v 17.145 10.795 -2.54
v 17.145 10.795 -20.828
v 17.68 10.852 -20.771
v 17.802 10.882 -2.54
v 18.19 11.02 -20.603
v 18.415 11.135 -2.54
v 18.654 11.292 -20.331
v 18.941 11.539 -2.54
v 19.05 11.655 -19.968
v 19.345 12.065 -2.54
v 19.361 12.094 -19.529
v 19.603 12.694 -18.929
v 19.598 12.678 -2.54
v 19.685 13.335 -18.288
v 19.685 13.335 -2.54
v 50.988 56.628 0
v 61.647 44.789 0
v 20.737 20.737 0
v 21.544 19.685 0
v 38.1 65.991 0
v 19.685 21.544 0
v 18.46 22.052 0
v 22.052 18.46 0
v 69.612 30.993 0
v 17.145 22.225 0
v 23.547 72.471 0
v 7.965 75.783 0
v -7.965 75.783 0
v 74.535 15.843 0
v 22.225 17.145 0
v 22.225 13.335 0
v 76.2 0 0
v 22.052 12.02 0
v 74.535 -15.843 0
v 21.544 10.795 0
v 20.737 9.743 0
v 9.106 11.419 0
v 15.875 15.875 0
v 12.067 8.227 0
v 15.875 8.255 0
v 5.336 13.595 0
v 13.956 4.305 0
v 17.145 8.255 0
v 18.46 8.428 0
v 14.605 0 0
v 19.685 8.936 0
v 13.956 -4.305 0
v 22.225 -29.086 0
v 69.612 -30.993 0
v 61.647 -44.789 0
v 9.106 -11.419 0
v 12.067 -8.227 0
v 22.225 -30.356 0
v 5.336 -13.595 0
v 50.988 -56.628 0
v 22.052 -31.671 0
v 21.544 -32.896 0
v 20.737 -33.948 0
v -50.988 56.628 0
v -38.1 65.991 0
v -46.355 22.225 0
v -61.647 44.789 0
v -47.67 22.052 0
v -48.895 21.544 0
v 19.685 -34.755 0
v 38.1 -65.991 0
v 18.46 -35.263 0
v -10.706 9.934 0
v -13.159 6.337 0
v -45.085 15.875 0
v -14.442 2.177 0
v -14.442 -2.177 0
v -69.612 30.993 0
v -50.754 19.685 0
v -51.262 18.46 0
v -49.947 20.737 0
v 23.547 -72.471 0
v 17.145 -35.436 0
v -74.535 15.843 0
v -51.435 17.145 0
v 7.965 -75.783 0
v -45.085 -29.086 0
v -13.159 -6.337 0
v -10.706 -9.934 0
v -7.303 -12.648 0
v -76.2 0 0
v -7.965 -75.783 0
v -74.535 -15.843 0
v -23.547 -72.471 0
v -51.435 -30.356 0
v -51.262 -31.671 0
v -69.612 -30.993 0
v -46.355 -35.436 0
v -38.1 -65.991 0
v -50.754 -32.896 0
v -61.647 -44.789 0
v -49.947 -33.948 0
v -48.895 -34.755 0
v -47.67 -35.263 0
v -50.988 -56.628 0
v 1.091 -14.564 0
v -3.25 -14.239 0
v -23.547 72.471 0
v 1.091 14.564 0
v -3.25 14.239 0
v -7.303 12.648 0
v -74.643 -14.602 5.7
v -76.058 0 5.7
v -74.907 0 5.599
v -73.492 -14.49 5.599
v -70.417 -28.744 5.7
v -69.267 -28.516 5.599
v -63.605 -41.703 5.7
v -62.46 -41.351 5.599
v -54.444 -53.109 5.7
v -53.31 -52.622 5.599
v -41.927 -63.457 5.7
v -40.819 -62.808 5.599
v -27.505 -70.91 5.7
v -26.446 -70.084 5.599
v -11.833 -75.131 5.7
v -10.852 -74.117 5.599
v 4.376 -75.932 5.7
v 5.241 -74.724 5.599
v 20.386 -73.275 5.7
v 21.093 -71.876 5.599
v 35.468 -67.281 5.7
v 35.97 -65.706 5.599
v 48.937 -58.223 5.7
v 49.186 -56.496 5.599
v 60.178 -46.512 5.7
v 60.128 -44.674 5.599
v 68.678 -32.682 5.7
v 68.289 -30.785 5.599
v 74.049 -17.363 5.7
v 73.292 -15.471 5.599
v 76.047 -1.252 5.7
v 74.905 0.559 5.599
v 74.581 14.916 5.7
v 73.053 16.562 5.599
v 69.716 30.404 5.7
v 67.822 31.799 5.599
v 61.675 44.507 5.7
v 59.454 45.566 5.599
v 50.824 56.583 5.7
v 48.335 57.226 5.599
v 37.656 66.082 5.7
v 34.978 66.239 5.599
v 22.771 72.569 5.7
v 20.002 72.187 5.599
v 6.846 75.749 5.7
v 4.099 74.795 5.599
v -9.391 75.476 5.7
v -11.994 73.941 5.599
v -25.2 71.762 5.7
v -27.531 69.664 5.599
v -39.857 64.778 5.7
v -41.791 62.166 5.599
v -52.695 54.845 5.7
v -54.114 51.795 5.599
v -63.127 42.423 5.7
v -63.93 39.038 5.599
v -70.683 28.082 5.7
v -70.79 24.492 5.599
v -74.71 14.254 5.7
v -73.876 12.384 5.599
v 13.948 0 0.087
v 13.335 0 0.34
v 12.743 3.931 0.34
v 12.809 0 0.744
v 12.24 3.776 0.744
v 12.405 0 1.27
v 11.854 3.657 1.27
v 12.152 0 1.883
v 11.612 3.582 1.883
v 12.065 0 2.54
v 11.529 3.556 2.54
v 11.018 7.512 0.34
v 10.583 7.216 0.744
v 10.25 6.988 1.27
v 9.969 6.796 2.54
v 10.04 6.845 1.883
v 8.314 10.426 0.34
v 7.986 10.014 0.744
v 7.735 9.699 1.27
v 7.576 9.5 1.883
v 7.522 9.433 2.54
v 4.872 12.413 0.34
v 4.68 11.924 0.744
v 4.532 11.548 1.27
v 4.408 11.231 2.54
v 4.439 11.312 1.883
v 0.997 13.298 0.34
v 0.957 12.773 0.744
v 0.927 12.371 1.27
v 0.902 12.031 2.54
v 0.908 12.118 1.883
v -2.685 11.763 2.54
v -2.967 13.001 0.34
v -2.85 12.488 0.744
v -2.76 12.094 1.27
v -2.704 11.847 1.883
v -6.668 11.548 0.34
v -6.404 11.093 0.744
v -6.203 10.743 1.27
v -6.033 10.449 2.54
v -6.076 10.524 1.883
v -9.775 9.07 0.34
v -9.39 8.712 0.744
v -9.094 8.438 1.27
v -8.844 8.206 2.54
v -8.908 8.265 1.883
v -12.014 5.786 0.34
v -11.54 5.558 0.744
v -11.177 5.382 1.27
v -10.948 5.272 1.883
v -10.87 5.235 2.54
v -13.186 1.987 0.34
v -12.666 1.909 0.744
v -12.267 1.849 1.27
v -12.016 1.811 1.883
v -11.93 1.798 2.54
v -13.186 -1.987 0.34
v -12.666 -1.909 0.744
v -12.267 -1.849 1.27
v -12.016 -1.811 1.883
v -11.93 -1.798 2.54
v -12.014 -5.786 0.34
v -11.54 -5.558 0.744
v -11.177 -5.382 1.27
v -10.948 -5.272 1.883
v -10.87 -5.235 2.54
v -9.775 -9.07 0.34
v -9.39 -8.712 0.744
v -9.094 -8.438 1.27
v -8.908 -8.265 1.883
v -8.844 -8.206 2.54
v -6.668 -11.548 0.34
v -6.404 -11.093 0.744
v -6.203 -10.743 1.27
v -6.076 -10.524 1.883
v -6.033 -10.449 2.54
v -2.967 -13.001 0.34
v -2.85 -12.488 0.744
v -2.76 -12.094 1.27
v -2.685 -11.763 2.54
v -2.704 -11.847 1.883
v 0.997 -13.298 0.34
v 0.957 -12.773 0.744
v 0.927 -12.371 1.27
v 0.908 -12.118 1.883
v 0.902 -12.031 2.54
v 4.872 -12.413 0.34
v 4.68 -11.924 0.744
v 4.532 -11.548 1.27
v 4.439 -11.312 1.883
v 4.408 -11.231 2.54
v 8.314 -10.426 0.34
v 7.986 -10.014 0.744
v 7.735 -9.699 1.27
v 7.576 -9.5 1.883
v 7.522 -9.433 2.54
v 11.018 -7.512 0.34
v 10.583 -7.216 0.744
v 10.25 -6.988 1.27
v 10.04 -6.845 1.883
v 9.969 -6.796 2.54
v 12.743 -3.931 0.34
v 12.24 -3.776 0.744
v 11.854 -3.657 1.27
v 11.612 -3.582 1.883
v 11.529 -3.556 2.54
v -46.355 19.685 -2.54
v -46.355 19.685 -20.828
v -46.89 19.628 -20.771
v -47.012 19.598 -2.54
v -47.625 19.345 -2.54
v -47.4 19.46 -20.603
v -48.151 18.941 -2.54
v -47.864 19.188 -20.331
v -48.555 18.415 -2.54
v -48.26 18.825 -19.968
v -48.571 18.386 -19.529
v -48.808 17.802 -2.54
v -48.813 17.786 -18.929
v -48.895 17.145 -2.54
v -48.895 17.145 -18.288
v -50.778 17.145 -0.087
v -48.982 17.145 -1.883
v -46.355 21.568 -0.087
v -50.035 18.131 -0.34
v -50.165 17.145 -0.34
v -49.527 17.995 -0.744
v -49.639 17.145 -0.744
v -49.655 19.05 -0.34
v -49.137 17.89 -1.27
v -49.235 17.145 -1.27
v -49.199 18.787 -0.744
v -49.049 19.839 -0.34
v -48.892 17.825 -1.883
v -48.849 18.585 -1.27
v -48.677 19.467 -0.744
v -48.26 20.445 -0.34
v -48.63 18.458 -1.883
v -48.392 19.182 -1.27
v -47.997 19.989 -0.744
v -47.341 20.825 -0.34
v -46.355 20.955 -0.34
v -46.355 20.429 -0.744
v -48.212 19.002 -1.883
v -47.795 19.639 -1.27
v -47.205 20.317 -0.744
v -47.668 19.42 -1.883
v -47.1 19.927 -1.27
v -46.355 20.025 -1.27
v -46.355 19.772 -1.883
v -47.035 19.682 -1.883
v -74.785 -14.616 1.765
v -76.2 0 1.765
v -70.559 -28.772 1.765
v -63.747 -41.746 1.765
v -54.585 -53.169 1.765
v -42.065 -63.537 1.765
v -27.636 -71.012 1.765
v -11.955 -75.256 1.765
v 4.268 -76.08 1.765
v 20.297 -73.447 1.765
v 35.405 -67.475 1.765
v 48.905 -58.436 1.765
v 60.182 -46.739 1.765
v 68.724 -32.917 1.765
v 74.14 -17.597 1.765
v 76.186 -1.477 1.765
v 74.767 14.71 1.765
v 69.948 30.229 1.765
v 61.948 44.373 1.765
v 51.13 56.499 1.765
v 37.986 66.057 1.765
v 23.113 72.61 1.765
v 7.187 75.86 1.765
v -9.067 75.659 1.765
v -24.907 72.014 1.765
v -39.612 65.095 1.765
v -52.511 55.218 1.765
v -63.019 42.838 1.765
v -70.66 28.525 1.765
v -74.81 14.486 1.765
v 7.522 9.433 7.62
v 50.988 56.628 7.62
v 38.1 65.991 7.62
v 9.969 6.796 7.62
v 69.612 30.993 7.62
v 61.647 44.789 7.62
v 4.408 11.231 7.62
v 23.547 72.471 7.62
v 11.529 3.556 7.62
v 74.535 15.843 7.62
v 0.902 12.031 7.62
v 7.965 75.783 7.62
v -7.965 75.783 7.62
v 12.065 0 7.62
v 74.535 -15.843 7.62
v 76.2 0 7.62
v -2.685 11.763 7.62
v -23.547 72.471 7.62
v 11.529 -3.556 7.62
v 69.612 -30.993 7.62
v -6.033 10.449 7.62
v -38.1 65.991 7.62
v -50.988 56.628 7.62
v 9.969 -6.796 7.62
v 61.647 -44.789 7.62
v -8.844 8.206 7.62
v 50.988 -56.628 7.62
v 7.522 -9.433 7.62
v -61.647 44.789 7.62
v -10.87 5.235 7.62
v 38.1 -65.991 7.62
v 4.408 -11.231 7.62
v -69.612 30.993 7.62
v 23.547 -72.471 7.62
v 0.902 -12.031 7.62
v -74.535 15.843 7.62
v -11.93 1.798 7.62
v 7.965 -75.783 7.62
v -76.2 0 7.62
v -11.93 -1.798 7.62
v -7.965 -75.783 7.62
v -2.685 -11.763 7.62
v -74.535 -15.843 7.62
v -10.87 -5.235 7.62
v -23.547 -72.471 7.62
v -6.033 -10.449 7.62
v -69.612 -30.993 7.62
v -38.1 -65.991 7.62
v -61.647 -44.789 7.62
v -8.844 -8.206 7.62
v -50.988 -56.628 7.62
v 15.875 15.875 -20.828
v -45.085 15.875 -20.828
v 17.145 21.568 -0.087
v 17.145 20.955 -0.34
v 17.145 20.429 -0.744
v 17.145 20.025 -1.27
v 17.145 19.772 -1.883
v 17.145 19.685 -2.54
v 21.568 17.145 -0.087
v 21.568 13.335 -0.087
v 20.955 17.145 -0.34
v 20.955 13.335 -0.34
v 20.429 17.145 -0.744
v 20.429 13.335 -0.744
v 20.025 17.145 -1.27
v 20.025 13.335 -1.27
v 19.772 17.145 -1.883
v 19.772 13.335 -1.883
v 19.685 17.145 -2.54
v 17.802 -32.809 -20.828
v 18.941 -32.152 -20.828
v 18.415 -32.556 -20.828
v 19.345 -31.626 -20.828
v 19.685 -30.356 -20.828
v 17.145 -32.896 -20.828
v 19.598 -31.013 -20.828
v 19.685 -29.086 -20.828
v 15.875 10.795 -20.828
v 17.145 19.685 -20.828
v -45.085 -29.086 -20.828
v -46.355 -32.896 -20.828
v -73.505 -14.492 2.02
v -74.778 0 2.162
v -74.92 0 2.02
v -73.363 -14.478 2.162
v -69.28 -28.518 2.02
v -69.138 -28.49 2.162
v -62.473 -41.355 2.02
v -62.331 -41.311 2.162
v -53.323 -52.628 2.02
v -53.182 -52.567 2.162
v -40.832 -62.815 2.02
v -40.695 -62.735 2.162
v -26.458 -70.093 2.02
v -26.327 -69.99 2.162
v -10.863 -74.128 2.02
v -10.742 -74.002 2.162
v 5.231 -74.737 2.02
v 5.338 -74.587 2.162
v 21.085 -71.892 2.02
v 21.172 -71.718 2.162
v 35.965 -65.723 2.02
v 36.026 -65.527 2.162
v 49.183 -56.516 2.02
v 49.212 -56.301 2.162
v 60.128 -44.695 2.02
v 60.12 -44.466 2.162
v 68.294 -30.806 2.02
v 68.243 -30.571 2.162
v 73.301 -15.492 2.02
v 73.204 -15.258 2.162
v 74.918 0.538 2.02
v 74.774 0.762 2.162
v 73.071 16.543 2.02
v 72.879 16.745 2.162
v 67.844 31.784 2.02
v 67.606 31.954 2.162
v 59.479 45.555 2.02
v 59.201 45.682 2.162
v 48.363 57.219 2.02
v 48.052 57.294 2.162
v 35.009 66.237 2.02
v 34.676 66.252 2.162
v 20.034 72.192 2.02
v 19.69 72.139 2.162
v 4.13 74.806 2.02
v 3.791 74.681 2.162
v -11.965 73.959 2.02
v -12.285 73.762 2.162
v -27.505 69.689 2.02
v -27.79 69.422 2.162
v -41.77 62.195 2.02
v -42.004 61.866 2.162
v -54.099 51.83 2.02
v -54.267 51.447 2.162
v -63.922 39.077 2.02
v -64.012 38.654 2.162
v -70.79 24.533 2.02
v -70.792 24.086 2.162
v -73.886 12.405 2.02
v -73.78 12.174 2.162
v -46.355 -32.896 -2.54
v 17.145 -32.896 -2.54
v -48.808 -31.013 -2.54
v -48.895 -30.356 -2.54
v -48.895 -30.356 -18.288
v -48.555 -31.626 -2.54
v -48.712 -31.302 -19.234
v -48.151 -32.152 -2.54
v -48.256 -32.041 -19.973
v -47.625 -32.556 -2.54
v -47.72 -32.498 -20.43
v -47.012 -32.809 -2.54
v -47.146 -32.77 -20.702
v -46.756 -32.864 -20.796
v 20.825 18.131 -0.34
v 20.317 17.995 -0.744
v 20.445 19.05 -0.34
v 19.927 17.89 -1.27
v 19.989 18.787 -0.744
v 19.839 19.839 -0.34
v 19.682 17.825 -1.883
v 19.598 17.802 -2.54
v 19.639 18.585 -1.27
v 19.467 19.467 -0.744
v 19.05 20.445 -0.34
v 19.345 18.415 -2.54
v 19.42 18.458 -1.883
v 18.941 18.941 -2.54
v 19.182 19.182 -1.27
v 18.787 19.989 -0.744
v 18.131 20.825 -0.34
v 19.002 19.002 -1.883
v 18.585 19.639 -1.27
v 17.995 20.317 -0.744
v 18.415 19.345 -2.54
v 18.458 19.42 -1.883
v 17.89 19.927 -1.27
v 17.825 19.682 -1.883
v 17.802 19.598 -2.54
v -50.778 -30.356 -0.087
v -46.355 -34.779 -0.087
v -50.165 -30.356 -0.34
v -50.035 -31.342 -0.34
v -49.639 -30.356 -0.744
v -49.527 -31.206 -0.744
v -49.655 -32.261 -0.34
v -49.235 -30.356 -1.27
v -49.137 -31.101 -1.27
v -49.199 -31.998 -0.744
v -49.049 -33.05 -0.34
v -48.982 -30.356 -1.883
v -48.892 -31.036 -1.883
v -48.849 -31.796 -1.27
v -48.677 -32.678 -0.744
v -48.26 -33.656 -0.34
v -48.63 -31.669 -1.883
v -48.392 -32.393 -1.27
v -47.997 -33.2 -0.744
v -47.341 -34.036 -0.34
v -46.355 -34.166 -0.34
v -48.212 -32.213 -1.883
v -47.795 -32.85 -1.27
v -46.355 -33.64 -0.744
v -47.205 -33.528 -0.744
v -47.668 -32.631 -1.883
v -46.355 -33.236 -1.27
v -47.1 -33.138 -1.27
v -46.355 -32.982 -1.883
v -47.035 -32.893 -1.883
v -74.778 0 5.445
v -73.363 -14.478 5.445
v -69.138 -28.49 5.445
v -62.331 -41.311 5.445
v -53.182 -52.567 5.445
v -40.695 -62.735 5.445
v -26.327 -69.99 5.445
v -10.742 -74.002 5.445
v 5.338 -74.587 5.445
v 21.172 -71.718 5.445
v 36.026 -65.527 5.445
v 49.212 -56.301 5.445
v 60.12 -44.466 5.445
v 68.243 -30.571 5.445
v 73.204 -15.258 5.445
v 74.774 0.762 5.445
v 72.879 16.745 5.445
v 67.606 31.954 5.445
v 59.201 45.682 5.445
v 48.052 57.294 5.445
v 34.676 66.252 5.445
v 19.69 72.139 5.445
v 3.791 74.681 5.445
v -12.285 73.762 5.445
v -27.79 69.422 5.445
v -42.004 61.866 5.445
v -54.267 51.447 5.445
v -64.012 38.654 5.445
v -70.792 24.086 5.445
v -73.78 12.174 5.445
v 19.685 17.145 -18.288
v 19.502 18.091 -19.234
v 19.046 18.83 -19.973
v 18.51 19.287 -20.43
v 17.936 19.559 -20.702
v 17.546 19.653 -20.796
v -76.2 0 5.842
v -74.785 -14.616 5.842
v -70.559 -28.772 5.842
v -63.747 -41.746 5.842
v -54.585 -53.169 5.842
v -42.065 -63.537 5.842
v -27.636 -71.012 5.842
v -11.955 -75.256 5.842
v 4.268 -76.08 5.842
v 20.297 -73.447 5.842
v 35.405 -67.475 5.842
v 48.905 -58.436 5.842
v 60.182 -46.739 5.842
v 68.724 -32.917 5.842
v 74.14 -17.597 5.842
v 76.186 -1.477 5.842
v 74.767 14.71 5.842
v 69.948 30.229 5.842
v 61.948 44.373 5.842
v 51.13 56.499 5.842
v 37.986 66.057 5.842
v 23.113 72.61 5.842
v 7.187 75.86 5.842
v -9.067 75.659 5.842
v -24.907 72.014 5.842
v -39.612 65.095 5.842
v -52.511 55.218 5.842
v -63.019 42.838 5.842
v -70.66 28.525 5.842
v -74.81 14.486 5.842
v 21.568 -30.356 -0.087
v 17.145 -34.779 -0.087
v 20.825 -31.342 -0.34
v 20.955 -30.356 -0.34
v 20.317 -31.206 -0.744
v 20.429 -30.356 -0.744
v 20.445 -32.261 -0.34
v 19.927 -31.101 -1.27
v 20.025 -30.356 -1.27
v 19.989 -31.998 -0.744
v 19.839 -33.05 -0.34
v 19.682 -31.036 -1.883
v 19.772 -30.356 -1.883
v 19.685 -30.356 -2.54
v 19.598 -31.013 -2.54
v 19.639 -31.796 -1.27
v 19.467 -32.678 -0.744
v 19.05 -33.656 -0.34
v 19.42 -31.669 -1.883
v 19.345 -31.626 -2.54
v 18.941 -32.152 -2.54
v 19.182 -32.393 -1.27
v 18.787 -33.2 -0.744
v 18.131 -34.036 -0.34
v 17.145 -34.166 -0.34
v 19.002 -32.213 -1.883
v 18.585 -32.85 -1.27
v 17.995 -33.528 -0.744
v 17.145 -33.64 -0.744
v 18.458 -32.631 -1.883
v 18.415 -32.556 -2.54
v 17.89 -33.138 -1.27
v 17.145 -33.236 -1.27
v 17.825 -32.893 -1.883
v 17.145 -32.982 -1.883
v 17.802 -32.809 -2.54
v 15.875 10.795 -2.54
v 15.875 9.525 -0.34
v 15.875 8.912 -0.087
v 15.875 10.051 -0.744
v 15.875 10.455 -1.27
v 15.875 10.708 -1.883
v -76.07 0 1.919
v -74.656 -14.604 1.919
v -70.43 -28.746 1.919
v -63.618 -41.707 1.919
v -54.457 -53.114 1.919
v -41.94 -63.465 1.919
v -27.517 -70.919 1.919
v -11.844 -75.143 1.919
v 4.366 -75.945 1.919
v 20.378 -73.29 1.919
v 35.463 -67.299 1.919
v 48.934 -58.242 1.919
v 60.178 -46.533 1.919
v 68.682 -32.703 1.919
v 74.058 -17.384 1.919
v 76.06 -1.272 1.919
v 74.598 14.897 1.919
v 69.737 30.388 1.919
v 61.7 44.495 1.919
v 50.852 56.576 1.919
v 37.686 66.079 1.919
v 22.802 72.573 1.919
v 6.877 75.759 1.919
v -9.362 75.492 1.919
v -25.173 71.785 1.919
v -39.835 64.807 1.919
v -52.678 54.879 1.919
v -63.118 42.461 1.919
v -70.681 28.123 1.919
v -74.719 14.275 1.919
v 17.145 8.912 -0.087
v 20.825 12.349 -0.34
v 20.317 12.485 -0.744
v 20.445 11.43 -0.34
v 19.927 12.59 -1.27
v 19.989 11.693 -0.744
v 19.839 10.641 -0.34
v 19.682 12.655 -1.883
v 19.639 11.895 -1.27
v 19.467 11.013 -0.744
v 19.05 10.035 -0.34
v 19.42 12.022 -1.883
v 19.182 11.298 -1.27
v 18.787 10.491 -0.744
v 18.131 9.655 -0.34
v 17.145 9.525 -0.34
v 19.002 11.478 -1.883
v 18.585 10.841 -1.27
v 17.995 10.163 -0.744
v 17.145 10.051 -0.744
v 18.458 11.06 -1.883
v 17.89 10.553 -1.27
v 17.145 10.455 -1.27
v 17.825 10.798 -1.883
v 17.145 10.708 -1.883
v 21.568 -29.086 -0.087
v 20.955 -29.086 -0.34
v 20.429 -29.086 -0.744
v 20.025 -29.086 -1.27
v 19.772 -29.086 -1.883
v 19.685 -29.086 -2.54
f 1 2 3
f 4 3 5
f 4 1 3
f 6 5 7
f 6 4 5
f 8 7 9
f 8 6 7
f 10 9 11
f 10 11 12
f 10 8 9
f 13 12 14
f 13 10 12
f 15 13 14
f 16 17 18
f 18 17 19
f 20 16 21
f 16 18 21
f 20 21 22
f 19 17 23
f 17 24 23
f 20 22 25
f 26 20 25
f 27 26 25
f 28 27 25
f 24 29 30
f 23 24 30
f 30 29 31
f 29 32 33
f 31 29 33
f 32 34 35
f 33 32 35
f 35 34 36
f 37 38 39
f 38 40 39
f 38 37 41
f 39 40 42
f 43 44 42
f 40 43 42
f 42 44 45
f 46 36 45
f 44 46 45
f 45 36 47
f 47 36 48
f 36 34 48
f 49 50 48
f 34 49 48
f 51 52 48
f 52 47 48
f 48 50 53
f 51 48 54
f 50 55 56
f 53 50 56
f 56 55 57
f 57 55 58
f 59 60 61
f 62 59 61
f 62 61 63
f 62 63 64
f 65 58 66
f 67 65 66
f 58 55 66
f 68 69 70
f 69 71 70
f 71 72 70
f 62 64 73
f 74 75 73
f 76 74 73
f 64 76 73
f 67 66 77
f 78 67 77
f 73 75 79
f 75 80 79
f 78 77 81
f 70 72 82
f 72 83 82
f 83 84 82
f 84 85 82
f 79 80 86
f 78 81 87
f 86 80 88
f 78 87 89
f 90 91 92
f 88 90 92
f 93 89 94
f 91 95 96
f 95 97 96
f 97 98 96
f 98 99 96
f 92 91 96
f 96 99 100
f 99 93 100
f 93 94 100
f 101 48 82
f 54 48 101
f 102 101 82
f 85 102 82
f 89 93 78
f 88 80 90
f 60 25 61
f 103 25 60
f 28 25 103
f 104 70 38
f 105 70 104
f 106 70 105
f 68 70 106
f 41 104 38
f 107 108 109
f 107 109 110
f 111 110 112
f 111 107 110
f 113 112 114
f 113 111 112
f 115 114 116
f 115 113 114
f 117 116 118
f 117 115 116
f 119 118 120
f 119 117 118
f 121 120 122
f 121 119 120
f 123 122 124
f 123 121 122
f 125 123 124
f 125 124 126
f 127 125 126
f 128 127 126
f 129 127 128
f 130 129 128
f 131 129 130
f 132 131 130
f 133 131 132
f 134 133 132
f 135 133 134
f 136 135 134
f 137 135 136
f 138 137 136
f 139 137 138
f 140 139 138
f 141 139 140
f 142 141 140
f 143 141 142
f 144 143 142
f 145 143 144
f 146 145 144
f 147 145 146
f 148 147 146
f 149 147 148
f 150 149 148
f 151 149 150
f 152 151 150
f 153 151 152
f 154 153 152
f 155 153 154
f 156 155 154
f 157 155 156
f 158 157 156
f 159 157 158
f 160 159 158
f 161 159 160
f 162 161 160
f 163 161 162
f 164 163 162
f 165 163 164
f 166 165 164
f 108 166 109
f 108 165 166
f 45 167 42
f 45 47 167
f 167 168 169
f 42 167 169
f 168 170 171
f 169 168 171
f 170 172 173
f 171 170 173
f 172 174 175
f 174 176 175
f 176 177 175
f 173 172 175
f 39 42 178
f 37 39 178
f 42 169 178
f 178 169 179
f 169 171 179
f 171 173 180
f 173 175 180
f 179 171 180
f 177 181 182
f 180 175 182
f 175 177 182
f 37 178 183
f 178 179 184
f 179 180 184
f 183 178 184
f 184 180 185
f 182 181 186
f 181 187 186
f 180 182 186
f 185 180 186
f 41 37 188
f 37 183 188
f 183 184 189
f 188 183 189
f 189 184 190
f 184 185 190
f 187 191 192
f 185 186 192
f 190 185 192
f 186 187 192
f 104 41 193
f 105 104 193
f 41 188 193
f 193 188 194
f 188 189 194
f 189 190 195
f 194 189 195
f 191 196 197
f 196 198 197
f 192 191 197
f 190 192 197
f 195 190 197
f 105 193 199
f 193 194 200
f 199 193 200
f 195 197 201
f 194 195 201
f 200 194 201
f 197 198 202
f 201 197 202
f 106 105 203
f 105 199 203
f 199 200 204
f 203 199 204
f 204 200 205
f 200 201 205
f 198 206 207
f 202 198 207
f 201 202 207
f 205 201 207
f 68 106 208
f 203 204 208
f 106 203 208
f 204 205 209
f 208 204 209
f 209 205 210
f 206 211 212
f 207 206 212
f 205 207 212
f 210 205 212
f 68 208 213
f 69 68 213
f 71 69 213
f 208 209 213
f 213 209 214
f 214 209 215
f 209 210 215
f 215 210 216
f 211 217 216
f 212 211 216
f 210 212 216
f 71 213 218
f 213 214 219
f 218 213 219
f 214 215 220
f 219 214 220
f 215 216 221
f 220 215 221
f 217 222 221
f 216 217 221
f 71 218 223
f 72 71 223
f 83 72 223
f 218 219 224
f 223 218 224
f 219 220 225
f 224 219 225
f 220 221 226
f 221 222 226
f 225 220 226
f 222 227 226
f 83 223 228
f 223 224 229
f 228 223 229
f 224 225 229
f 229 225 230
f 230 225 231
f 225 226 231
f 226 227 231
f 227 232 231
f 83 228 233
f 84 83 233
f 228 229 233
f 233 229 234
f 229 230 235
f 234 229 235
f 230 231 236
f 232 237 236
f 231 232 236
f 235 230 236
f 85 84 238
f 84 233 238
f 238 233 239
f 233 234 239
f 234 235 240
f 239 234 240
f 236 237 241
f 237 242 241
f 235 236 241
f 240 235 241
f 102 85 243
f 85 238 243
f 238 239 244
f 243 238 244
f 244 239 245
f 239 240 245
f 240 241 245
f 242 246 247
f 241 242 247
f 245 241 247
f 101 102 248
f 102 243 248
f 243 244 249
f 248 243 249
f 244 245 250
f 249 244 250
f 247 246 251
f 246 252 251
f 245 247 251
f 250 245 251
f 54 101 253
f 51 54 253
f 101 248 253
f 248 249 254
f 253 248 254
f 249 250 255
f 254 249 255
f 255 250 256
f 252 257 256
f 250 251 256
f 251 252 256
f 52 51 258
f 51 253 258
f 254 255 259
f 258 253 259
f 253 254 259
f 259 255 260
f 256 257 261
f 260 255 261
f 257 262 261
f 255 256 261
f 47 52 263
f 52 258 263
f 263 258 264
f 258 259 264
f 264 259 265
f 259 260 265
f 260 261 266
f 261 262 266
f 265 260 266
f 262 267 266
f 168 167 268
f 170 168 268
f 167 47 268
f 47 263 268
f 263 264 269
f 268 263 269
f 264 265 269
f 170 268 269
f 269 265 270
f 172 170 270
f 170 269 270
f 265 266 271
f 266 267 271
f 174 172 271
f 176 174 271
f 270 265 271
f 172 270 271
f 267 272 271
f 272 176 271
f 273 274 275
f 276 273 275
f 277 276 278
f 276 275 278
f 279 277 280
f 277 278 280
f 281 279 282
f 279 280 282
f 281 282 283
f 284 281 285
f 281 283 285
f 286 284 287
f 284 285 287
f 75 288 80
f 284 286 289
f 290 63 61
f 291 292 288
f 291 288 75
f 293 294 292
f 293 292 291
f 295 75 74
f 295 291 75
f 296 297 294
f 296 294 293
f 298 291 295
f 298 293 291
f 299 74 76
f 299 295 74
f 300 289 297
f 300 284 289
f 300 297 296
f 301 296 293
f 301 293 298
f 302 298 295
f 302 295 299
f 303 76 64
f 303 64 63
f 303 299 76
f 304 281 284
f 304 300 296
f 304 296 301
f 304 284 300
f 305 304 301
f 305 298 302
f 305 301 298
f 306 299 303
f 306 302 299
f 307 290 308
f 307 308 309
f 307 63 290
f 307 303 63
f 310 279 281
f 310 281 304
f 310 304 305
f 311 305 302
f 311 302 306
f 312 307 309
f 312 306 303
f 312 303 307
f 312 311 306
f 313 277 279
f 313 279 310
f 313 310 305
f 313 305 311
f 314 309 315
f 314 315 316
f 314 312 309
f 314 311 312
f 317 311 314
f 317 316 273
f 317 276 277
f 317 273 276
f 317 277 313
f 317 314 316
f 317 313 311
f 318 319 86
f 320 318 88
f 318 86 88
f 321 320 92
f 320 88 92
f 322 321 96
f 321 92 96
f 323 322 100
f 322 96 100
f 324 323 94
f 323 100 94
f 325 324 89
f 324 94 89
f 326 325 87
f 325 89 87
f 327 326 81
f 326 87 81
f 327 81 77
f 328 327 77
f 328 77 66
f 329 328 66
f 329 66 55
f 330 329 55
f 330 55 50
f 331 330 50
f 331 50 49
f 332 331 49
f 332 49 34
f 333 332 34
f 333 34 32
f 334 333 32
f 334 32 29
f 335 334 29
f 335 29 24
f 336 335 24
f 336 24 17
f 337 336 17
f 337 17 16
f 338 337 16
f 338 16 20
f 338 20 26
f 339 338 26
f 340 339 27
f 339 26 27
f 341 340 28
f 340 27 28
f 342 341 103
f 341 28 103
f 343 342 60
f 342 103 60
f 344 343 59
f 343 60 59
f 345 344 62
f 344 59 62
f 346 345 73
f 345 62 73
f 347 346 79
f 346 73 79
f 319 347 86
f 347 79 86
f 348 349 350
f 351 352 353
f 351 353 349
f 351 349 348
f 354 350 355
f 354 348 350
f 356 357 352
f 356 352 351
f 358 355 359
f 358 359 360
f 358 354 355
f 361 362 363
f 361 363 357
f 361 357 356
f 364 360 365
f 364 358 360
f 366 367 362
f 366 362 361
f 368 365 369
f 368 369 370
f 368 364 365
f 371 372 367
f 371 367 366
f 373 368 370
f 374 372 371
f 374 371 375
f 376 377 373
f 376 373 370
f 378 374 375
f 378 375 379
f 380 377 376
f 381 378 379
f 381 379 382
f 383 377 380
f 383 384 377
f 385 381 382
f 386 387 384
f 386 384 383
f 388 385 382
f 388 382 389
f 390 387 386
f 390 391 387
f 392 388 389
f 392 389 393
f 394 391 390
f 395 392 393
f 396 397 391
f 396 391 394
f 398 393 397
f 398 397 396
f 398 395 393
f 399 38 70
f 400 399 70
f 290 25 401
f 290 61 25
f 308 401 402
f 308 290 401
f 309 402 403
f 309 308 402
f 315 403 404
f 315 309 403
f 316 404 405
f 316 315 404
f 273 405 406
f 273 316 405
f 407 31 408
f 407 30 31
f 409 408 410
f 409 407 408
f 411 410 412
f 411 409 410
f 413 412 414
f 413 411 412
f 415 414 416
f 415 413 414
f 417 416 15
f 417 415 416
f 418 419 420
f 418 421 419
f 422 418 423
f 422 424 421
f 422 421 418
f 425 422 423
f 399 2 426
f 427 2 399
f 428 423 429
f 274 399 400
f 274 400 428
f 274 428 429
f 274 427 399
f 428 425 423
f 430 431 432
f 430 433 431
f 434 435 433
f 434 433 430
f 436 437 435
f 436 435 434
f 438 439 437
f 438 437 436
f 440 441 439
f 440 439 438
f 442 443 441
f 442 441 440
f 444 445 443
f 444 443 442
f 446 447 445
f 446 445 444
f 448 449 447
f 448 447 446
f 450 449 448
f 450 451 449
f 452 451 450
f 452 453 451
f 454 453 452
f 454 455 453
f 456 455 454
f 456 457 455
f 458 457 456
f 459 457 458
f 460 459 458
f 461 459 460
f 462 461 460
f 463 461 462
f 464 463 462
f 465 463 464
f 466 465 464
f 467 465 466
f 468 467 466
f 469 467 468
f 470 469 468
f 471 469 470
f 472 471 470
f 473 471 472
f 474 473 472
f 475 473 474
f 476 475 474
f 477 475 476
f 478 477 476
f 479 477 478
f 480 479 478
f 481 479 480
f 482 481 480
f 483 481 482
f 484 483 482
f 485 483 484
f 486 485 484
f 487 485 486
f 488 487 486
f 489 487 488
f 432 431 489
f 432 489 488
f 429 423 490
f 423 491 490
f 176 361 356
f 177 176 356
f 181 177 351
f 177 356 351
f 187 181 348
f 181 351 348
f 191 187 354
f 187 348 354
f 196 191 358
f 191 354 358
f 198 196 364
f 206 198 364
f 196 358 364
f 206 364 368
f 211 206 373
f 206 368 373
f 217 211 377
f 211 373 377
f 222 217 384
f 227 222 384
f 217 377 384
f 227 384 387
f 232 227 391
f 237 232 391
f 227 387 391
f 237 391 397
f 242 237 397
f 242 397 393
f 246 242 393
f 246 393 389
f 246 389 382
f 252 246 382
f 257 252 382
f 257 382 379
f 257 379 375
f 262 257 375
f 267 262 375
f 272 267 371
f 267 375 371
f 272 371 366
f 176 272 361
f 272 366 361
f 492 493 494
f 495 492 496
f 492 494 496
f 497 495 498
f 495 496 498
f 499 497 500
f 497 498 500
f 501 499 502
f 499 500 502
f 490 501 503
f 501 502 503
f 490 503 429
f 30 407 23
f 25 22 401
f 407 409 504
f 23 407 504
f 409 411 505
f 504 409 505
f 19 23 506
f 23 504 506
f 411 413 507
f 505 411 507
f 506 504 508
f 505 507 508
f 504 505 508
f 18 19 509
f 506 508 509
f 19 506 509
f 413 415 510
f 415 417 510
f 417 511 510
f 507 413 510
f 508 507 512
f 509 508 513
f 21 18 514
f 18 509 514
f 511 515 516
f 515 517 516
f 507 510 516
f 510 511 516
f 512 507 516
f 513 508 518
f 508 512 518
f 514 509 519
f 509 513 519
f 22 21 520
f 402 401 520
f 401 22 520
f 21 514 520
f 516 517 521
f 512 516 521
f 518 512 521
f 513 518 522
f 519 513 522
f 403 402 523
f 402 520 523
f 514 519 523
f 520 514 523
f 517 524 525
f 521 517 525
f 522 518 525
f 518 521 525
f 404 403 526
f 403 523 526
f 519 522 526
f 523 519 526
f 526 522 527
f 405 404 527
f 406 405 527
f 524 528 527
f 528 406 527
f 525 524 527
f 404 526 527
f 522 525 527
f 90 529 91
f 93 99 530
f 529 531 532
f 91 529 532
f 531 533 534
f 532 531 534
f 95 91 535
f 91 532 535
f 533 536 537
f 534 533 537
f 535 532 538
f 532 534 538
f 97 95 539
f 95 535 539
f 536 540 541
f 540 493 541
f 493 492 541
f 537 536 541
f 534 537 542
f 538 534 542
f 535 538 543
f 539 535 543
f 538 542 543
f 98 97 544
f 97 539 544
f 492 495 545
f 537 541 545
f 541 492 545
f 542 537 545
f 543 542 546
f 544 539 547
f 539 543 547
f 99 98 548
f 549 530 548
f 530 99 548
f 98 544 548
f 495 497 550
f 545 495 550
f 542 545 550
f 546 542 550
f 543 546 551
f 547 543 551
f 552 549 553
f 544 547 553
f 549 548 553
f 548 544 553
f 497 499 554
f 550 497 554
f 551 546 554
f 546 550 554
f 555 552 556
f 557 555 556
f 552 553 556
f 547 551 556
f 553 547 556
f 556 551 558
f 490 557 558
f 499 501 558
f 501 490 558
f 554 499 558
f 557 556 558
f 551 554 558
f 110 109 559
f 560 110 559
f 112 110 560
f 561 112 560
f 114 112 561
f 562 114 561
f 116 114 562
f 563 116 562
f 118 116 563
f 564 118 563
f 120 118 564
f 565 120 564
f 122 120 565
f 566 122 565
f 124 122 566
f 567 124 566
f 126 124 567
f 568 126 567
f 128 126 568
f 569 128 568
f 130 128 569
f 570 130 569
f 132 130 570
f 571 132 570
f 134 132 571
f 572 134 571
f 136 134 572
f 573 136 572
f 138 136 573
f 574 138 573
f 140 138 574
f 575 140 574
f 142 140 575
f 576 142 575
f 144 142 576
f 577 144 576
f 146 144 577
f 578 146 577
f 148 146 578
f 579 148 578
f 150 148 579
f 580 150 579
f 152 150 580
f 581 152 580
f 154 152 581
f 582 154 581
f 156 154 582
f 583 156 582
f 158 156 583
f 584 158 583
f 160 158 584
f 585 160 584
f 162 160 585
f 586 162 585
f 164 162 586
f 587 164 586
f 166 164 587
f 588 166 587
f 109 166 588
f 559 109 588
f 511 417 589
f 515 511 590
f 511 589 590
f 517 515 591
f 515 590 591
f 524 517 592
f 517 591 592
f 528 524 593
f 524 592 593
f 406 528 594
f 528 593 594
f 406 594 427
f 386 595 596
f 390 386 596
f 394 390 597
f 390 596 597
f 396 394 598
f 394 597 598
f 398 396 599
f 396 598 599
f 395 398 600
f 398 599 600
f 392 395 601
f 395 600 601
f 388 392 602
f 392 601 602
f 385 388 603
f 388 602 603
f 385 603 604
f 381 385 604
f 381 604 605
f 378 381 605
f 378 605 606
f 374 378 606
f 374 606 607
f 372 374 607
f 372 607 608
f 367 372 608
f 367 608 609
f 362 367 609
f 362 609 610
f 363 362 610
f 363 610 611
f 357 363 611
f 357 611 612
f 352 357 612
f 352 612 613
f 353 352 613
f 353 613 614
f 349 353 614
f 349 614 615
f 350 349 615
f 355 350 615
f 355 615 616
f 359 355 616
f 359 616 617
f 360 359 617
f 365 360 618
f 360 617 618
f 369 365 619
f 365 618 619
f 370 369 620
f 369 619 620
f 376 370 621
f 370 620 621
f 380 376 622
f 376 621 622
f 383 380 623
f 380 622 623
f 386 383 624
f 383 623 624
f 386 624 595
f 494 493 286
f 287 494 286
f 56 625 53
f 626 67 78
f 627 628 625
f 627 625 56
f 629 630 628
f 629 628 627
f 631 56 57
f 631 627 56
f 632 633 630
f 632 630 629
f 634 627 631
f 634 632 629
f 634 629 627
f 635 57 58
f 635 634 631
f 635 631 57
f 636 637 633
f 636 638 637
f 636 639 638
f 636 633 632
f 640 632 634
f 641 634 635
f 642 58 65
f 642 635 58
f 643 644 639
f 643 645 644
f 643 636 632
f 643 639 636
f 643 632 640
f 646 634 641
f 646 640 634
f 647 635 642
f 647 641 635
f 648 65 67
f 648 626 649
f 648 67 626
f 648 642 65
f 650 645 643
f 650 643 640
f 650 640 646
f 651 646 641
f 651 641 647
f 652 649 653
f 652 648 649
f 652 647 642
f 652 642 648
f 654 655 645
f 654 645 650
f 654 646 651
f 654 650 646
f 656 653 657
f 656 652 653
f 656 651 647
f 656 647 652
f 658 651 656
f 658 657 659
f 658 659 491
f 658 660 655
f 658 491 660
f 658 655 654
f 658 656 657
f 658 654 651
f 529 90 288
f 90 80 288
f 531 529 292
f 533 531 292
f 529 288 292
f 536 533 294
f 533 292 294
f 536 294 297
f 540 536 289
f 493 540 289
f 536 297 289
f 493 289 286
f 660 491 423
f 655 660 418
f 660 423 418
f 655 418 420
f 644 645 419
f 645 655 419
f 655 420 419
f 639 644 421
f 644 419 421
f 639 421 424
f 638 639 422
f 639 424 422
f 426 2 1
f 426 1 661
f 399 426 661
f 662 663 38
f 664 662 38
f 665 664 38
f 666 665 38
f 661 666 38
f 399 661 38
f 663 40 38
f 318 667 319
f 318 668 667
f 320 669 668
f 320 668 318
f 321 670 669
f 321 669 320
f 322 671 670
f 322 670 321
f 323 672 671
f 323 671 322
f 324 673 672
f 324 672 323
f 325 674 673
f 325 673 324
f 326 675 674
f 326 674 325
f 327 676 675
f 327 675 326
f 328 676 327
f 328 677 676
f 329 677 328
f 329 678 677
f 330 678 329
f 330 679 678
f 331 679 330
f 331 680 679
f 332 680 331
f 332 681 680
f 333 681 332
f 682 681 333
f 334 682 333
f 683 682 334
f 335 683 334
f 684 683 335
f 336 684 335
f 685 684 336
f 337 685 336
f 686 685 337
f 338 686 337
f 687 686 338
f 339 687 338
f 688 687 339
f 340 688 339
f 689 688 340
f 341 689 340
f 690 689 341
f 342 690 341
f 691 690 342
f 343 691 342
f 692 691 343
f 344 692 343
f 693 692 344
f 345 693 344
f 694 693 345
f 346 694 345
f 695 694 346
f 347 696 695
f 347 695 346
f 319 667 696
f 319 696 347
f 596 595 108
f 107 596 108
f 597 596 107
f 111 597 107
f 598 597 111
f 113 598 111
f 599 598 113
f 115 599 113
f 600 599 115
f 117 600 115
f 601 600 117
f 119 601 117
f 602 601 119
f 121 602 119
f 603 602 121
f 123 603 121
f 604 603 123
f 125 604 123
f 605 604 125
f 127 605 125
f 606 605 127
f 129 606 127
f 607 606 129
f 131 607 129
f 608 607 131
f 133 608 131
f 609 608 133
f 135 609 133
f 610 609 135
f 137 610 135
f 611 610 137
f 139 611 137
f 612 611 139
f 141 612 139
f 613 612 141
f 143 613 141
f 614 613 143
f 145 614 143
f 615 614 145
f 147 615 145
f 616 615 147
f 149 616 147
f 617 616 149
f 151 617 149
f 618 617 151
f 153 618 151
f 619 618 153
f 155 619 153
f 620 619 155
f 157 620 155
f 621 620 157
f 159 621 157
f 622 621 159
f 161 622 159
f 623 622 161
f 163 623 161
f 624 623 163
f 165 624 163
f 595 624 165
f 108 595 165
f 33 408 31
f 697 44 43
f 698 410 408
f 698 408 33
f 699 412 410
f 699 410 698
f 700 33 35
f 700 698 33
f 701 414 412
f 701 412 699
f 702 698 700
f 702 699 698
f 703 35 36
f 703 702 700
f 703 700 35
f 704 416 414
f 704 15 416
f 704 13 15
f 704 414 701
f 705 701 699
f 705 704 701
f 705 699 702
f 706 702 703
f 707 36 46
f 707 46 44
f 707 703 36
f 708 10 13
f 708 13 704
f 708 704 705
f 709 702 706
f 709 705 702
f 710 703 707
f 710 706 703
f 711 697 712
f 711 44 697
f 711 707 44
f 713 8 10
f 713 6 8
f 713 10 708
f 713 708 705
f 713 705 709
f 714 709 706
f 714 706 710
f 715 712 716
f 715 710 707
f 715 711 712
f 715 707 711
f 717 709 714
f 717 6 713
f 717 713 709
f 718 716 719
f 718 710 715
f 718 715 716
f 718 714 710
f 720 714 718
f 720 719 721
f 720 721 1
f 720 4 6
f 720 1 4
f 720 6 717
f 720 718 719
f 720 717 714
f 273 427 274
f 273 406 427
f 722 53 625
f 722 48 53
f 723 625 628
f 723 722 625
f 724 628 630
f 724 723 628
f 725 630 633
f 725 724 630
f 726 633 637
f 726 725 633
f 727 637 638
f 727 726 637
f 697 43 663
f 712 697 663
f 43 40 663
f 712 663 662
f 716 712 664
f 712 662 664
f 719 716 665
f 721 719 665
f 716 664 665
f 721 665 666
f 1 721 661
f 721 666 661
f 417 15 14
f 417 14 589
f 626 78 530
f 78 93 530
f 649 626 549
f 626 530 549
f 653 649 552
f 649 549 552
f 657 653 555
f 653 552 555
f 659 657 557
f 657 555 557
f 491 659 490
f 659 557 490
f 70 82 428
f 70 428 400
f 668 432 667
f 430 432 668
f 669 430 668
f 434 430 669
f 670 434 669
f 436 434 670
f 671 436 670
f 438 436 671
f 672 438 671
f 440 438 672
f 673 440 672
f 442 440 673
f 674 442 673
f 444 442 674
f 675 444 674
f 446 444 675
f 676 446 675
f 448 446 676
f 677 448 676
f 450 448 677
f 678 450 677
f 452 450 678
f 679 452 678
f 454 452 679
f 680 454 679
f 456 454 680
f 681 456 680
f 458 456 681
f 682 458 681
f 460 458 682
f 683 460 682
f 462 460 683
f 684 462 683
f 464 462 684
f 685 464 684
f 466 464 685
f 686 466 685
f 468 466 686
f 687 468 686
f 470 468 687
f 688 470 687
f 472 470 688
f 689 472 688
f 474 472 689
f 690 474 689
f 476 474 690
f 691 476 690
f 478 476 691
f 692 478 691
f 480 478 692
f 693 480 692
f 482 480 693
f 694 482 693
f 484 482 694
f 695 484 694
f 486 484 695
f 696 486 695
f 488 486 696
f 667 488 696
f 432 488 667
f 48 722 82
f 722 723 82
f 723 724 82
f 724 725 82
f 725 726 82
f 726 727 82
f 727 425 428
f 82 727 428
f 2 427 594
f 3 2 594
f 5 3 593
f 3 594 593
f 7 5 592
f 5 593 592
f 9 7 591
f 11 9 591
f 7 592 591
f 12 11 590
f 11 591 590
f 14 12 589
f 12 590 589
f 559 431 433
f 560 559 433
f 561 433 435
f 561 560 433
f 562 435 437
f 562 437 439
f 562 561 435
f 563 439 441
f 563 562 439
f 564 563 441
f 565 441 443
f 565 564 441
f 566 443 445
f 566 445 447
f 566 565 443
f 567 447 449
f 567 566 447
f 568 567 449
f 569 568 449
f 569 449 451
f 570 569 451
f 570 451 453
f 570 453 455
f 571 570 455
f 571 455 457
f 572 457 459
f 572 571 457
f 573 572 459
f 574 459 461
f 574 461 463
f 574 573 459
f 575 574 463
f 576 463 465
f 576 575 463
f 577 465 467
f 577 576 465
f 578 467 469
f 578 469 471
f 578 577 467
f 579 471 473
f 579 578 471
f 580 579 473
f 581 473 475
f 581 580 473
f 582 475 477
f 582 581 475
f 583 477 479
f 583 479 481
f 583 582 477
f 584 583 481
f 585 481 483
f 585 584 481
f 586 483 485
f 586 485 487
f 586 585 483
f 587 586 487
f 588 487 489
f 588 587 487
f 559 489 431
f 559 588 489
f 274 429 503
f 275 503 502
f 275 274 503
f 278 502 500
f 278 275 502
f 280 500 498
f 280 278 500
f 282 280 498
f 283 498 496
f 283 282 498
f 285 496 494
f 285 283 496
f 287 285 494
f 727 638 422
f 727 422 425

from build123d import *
from OCP.BRepFilletAPI import BRepFilletAPI_MakeChamfer

# Parameters (mm, degrees)
SKETCH1_R           = 76.2
BOSS_EXTRUDE1_DEPTH = 7.62
CHAMFER1_SIZE       = 0.13
CHAMFER1_SIZE2      = 0.143008173
SKETCH3_R           = 12.065
CUT_EXTRUDE1_DEPTH  = 7.62
SKETCH4_W           = 68.58
SKETCH4_H           = 52.580948596
SKETCH4_W_2         = 60.96
SKETCH4_H_2         = 44.960948596
BOSS_EXTRUDE2_DEPTH = 20.828
SKETCH5_W           = 3.81
SKETCH5_H           = 39.880948596
CUT_EXTRUDE3_DEPTH  = 20.828
FILLET1_R           = 2.54


with BuildPart() as part:
    # Sketch1 → Boss-Extrude1 (new body)
    with BuildSketch(Plane.XY):
        with Locations(Location((0, 0, 0), (0, 0, 180))):
            Circle(SKETCH1_R)
    extrude(amount=BOSS_EXTRUDE1_DEPTH)

    # Sketch2 → Cut-Revolve1 (revolve, cut)
    with BuildSketch(Plane(origin=(0, 0, 0), x_dir=(0, 0, -1), z_dir=(1, 0, 0)), mode=Mode.PRIVATE) as cut_revolve1_sk:
        Polygon((-1.907556125, 76.2), (-2.032, 74.7776), (-5.588, 74.7776), (-5.712443875, 76.2), align=None)
    revolve(cut_revolve1_sk.sketch.rotate(Axis((0, 0, 0), (0, 0, 1)), 90), axis=Axis((0, 0, 0), (0, 0, 1)), mode=Mode.SUBTRACT)

    # Chamfer1: one chamfer whose edges measure the first distance from different faces: ONE call of the kernel's chamfer builder (chamfer() names one face for all edges)
    chamfer1_edges_1 = [part.edges().sort_by_distance(p)[0] for p in [
        (76.2, 0, 5.712443875),
    ]]
    chamfer1_side_1 = [part.faces().sort_by_distance(p)[0] for p in [
        (76.2, 0, 6.666221937),
    ]]
    chamfer1_edges_2 = [part.edges().sort_by_distance(p)[0] for p in [
        (76.2, 0, 1.907556125),
    ]]
    chamfer1_side_2 = [part.faces().sort_by_distance(p)[0] for p in [
        (75.4888, 0, 1.969778063),
    ]]
    chamfer1_edges_3 = [part.edges().sort_by_distance(p)[0] for p in [
        (74.7776, 0, 2.032),
    ]]
    chamfer1_side_3 = [part.faces().sort_by_distance(p)[0] for p in [
        (74.7776, 0, 3.81),
    ]]
    chamfer1_edges_4 = [part.edges().sort_by_distance(p)[0] for p in [
        (74.7776, 0, 5.588),
    ]]
    chamfer1_side_4 = [part.faces().sort_by_distance(p)[0] for p in [
        (75.4888, 0, 5.650221937),
    ]]
    chamfer1 = BRepFilletAPI_MakeChamfer(part.part.solid().wrapped)
    for e in chamfer1_edges_1:
        chamfer1.Add(CHAMFER1_SIZE, CHAMFER1_SIZE2, e.wrapped, chamfer1_side_1[0].wrapped)  # the first distance lies on this face
    for e in chamfer1_edges_2:
        chamfer1.Add(CHAMFER1_SIZE, CHAMFER1_SIZE2, e.wrapped, chamfer1_side_2[0].wrapped)  # the first distance lies on this face
    for e in chamfer1_edges_3:
        chamfer1.Add(CHAMFER1_SIZE, CHAMFER1_SIZE2, e.wrapped, chamfer1_side_3[0].wrapped)  # the first distance lies on this face
    for e in chamfer1_edges_4:
        chamfer1.Add(CHAMFER1_SIZE, CHAMFER1_SIZE2, e.wrapped, chamfer1_side_4[0].wrapped)  # the first distance lies on this face
    add(Compound.cast(chamfer1.Shape()), mode=Mode.REPLACE)

    # Sketch3 → Cut-Extrude1 (cut)
    with BuildSketch(Plane.XY.offset(7.62)):
        Circle(SKETCH3_R)
    extrude(amount=-CUT_EXTRUDE1_DEPTH, mode=Mode.SUBTRACT)

    # Sketch4 → Boss-Extrude2 (add)
    with BuildSketch(Plane(origin=(0, 0, 0), x_dir=(-1, 0, 0), z_dir=(0, 0, -1))):
        with Locations((14.605, -6.605474298)):
            Rectangle(SKETCH4_W, SKETCH4_H)
        with Locations((14.605, -6.605474298)):
            Rectangle(SKETCH4_W_2, SKETCH4_H_2, mode=Mode.SUBTRACT)
    extrude(amount=BOSS_EXTRUDE2_DEPTH)

    # Sketch5 → Cut-Extrude3 (cut)
    with BuildSketch(Plane(origin=(0, 0, -20.828), x_dir=(-1, 0, 0), z_dir=(0, 0, -1))):
        with Locations((-17.78, -9.145474298)):
            Rectangle(SKETCH5_W, SKETCH5_H)
    extrude(amount=-CUT_EXTRUDE3_DEPTH, mode=Mode.SUBTRACT)

    # Fillet1
    fillet1_edges = [part.edges().sort_by_distance(p)[0] for p in [
        (-12.065, 0, 0),
        (19.685, -30.990948596, 0),
        (17.78, 10.795, 0),
        (-14.605, -32.895948596, 0),
        (-14.605, 19.685, 0),
        (19.685, 19.685, -10.414),
        (19.685, 15.24, -20.828),
        (19.685, 10.795, -10.414),
        (19.685, 15.24, 0),
        (-48.895, -32.895948596, -10.414),
        (-48.895, -6.605474298, -20.828),
        (-48.895, 19.685, -10.414),
        (-48.895, -6.605474298, 0),
        (19.685, -32.895948596, -10.414),
    ]]
    fillet(fillet1_edges, radius=FILLET1_R)


solid = part.part
